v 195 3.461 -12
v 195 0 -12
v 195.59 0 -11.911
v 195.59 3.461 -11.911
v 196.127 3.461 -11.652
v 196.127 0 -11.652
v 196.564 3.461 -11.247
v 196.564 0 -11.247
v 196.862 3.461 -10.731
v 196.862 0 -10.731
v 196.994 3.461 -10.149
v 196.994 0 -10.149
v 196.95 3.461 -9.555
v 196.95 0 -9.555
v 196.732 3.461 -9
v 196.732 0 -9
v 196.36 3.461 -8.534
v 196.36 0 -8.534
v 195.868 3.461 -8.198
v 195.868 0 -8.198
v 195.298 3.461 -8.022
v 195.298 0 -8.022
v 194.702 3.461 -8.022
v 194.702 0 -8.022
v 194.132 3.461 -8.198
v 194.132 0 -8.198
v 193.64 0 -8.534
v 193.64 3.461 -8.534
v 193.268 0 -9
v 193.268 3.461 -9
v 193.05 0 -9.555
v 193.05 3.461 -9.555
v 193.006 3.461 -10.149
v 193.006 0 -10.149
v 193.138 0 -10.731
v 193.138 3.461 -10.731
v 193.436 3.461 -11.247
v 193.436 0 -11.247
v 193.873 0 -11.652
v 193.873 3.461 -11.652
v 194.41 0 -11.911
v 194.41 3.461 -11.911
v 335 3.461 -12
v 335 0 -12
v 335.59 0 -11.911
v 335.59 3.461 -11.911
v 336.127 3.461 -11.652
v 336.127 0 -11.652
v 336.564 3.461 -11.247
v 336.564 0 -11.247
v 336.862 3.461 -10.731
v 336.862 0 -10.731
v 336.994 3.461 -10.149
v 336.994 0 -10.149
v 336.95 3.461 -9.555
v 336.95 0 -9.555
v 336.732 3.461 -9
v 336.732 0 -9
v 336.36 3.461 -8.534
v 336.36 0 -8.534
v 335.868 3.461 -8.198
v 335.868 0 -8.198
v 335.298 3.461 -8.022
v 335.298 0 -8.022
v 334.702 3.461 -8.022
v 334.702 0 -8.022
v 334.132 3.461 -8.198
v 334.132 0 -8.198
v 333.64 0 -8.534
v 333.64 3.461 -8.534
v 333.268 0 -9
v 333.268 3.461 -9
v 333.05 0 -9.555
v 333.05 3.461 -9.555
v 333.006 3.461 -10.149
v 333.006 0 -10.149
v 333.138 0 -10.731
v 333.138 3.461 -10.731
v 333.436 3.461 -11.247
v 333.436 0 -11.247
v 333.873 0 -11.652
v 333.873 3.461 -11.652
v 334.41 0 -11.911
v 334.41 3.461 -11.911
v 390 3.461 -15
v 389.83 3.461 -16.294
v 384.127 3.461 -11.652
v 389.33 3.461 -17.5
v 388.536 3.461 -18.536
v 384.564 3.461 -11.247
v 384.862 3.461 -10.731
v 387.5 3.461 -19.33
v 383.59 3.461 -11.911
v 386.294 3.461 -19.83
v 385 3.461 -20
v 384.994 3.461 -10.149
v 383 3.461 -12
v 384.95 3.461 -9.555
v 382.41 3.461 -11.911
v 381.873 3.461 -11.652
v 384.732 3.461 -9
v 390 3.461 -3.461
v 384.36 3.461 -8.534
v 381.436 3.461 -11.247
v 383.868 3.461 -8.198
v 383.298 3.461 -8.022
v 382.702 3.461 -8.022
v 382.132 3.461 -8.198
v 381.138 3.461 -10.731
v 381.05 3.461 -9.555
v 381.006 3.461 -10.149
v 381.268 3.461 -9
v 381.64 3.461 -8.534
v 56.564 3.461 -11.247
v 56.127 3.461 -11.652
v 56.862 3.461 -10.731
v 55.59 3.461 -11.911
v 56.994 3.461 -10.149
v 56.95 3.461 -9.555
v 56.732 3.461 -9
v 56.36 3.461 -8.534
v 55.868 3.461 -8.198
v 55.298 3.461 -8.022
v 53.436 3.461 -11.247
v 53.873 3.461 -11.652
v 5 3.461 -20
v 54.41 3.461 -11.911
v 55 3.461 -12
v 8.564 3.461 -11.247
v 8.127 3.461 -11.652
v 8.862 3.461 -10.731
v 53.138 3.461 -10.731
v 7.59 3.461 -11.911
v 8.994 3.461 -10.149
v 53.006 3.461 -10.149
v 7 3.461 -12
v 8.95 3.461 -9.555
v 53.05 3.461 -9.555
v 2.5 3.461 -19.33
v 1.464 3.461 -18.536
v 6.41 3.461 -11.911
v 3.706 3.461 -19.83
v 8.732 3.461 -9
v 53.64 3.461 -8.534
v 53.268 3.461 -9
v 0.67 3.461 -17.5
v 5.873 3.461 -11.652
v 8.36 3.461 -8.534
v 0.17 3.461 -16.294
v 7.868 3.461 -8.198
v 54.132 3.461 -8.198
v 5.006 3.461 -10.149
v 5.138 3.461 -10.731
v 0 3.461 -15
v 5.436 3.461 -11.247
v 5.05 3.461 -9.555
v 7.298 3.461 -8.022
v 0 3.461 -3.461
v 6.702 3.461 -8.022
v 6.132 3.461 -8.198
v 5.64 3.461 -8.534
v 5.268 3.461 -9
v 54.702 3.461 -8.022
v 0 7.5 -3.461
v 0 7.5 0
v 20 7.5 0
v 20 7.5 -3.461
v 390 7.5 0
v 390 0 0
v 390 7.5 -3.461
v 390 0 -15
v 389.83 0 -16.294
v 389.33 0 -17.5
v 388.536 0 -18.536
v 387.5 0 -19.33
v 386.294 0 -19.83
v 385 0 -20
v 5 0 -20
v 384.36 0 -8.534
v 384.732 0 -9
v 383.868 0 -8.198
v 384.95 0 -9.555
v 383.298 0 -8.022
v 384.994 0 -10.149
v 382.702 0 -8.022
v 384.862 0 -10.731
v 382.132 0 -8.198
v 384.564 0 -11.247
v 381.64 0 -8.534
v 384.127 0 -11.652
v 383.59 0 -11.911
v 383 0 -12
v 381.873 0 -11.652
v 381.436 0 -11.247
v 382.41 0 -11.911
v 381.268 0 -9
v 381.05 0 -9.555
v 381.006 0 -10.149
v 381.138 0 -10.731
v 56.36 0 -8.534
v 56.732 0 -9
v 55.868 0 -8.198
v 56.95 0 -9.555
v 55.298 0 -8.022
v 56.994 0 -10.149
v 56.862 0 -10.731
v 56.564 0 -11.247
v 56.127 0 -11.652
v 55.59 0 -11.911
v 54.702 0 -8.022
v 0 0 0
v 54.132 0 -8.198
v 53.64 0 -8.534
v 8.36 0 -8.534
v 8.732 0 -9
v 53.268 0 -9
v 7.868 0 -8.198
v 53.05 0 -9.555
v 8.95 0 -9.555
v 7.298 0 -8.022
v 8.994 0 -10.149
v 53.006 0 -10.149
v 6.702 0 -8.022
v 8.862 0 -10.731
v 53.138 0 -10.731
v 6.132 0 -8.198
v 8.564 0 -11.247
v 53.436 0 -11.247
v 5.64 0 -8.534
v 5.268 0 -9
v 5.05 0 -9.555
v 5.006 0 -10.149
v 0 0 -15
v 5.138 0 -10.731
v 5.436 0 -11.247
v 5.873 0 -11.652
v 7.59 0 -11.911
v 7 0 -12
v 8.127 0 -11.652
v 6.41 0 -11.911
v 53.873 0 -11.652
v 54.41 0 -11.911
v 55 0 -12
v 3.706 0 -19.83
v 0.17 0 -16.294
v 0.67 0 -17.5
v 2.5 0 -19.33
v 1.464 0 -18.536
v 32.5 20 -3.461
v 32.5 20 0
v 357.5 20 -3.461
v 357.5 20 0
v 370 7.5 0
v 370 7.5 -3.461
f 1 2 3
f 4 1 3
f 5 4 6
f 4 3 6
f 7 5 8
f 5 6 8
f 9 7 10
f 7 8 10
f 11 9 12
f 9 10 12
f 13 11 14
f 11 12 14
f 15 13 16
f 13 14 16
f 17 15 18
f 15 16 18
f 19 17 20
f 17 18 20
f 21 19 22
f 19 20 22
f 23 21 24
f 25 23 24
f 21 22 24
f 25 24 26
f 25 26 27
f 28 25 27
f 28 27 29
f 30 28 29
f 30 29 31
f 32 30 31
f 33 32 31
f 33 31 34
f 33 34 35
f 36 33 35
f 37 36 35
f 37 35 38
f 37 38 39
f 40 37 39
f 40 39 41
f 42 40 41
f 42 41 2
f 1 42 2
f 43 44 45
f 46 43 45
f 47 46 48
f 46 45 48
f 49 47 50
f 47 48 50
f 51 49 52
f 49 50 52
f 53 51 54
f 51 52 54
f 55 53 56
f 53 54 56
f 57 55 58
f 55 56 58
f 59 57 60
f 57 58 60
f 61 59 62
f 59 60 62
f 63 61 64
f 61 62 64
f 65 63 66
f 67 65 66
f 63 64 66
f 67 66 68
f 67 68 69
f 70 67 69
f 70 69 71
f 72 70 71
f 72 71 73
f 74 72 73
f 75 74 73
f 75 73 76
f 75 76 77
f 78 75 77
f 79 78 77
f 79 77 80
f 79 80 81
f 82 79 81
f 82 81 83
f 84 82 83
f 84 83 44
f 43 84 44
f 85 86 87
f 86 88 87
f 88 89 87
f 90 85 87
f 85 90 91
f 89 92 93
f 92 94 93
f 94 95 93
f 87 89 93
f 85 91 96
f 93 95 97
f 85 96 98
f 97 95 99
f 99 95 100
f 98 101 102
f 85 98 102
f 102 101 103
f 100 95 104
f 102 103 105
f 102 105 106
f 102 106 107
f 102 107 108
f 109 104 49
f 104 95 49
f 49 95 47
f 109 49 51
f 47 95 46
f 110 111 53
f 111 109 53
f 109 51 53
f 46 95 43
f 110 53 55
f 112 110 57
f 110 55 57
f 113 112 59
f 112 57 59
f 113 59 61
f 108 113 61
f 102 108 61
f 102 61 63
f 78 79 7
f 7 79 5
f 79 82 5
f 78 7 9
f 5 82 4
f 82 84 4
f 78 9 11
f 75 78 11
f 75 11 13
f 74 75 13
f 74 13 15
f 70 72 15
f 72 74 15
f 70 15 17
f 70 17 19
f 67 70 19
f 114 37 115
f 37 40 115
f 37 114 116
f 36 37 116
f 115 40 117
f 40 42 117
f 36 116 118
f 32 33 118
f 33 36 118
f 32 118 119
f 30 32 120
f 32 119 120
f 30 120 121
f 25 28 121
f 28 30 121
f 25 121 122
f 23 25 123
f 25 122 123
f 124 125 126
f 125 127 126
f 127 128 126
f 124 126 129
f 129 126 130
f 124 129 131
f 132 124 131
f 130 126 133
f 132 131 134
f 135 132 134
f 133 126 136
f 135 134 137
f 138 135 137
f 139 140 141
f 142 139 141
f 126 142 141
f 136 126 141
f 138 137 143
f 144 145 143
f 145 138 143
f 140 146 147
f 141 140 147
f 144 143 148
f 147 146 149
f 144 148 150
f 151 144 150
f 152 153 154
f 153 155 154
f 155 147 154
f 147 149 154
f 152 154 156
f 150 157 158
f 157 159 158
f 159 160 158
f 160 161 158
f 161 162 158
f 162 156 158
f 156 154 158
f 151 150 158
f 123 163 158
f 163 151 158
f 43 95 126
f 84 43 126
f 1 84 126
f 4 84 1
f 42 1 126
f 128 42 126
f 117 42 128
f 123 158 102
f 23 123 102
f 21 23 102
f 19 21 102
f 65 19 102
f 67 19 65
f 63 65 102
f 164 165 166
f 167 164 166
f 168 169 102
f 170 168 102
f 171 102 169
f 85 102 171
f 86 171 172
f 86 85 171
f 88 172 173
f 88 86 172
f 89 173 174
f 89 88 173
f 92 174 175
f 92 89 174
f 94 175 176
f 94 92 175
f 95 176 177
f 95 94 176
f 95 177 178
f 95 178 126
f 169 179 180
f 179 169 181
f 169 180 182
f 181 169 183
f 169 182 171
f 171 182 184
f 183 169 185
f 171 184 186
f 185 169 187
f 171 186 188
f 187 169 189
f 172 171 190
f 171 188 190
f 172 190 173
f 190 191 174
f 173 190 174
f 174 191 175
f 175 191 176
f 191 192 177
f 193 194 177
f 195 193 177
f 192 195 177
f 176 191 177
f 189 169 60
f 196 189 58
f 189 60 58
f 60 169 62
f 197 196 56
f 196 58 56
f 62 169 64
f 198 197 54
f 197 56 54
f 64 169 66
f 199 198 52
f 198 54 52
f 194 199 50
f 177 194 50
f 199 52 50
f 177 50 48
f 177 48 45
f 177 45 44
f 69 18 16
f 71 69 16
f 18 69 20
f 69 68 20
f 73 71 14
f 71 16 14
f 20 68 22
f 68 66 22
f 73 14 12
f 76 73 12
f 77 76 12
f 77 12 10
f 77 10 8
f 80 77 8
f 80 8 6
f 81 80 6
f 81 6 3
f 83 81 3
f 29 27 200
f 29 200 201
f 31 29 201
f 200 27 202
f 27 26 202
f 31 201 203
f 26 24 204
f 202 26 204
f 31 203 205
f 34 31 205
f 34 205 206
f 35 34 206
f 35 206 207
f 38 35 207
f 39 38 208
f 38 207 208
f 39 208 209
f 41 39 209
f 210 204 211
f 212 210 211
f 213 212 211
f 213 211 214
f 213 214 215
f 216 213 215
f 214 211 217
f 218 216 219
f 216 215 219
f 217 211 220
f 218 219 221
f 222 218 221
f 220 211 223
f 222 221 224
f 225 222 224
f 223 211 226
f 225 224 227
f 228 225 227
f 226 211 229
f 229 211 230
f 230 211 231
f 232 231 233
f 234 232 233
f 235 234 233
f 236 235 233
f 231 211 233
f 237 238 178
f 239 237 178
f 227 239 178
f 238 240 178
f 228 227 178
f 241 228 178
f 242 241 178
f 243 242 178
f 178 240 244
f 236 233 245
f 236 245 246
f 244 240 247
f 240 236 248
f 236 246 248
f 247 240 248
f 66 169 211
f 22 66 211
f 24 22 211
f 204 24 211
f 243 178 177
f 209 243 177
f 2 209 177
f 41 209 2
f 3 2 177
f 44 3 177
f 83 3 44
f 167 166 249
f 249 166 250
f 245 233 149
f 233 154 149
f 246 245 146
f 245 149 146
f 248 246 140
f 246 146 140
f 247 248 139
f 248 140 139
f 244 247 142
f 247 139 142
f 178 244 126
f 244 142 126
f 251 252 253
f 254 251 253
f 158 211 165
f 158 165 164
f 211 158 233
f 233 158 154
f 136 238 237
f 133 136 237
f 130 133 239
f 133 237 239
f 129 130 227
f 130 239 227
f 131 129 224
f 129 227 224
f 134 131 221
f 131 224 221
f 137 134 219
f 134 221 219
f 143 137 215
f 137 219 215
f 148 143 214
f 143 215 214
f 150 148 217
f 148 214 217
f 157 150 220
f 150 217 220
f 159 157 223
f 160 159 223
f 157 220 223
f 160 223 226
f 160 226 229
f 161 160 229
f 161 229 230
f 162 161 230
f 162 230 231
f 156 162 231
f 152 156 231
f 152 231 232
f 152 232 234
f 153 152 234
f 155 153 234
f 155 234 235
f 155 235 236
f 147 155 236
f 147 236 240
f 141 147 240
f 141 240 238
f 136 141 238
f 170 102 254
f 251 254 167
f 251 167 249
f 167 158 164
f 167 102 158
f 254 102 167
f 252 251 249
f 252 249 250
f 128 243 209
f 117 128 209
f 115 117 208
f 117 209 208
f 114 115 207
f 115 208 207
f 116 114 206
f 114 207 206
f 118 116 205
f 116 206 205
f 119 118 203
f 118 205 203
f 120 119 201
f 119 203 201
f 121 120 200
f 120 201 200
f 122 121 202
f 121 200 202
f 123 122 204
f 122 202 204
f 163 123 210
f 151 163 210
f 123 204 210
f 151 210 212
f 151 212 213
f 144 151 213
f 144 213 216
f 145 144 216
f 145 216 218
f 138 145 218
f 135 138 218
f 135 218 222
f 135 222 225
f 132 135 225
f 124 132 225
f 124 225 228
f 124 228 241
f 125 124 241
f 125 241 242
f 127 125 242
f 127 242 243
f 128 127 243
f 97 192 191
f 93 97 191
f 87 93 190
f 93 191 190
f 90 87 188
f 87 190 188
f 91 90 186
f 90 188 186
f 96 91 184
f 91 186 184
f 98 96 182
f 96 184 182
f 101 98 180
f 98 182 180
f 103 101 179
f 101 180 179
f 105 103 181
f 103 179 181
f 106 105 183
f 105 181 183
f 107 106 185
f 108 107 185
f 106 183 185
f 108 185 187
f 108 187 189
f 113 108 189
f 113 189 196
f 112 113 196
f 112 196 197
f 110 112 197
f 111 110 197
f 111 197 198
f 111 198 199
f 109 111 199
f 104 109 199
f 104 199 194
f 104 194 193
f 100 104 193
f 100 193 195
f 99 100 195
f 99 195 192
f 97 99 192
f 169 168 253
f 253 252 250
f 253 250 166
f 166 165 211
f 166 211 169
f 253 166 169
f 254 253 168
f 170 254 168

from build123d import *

# Parameters (mm, degrees)
BOSS_EXTRUDE1_DEPTH = 390
SKETCH2_R           = 2
CUT_EXTRUDE1_DEPTH  = 392.02429592
CUT_EXTRUDE2_DEPTH  = 392.02429592
FILLET1_R           = 5


with BuildPart() as part:
    # Sketch1 → Boss-Extrude1 (new body)
    with BuildSketch(Plane(origin=(0, 0, 0), x_dir=(0, 0, -1), z_dir=(1, 0, 0))):
        Polygon((0, 0), (20, 0), (20, 3.461178467), (3.461178467, 3.461178467), (3.461178467, 20), (0, 20), align=None)
    extrude(amount=BOSS_EXTRUDE1_DEPTH)

    # Sketch2 → Cut-Extrude1 (cut, through all)
    with BuildSketch(Plane.XZ):
        with Locations(Location((195, -10, 0), (0, 0, 270))):
            Circle(SKETCH2_R)
        with Locations(Location((335, -10, 0), (0, 0, 270))):
            Circle(SKETCH2_R)
        with Locations(Location((55, -10, 0), (0, 0, 270))):
            Circle(SKETCH2_R)
        with Locations(Location((383, -10, 0), (0, 0, 270))):
            Circle(SKETCH2_R)
        with Locations(Location((7, -10, 0), (0, 0, 270))):
            Circle(SKETCH2_R)
    extrude(amount=-CUT_EXTRUDE1_DEPTH, mode=Mode.SUBTRACT)

    # Sketch3 → Cut-Extrude2 (cut, through all)
    with BuildSketch(Plane.XY):
        Polygon((0, 7.5), (20, 7.5), (32.5, 20), (0, 20), align=None)
        Polygon((390, 20), (357.5, 20), (370, 7.5), (390, 7.5), align=None)
    extrude(amount=-CUT_EXTRUDE2_DEPTH, mode=Mode.SUBTRACT)

    # Fillet1
    fillet1_edges = [part.edges().sort_by_distance(p)[0] for p in [
        (390, 1.730589234, -20),
        (0, 1.730589234, -20),
    ]]
    fillet(fillet1_edges, radius=FILLET1_R)


solid = part.part
